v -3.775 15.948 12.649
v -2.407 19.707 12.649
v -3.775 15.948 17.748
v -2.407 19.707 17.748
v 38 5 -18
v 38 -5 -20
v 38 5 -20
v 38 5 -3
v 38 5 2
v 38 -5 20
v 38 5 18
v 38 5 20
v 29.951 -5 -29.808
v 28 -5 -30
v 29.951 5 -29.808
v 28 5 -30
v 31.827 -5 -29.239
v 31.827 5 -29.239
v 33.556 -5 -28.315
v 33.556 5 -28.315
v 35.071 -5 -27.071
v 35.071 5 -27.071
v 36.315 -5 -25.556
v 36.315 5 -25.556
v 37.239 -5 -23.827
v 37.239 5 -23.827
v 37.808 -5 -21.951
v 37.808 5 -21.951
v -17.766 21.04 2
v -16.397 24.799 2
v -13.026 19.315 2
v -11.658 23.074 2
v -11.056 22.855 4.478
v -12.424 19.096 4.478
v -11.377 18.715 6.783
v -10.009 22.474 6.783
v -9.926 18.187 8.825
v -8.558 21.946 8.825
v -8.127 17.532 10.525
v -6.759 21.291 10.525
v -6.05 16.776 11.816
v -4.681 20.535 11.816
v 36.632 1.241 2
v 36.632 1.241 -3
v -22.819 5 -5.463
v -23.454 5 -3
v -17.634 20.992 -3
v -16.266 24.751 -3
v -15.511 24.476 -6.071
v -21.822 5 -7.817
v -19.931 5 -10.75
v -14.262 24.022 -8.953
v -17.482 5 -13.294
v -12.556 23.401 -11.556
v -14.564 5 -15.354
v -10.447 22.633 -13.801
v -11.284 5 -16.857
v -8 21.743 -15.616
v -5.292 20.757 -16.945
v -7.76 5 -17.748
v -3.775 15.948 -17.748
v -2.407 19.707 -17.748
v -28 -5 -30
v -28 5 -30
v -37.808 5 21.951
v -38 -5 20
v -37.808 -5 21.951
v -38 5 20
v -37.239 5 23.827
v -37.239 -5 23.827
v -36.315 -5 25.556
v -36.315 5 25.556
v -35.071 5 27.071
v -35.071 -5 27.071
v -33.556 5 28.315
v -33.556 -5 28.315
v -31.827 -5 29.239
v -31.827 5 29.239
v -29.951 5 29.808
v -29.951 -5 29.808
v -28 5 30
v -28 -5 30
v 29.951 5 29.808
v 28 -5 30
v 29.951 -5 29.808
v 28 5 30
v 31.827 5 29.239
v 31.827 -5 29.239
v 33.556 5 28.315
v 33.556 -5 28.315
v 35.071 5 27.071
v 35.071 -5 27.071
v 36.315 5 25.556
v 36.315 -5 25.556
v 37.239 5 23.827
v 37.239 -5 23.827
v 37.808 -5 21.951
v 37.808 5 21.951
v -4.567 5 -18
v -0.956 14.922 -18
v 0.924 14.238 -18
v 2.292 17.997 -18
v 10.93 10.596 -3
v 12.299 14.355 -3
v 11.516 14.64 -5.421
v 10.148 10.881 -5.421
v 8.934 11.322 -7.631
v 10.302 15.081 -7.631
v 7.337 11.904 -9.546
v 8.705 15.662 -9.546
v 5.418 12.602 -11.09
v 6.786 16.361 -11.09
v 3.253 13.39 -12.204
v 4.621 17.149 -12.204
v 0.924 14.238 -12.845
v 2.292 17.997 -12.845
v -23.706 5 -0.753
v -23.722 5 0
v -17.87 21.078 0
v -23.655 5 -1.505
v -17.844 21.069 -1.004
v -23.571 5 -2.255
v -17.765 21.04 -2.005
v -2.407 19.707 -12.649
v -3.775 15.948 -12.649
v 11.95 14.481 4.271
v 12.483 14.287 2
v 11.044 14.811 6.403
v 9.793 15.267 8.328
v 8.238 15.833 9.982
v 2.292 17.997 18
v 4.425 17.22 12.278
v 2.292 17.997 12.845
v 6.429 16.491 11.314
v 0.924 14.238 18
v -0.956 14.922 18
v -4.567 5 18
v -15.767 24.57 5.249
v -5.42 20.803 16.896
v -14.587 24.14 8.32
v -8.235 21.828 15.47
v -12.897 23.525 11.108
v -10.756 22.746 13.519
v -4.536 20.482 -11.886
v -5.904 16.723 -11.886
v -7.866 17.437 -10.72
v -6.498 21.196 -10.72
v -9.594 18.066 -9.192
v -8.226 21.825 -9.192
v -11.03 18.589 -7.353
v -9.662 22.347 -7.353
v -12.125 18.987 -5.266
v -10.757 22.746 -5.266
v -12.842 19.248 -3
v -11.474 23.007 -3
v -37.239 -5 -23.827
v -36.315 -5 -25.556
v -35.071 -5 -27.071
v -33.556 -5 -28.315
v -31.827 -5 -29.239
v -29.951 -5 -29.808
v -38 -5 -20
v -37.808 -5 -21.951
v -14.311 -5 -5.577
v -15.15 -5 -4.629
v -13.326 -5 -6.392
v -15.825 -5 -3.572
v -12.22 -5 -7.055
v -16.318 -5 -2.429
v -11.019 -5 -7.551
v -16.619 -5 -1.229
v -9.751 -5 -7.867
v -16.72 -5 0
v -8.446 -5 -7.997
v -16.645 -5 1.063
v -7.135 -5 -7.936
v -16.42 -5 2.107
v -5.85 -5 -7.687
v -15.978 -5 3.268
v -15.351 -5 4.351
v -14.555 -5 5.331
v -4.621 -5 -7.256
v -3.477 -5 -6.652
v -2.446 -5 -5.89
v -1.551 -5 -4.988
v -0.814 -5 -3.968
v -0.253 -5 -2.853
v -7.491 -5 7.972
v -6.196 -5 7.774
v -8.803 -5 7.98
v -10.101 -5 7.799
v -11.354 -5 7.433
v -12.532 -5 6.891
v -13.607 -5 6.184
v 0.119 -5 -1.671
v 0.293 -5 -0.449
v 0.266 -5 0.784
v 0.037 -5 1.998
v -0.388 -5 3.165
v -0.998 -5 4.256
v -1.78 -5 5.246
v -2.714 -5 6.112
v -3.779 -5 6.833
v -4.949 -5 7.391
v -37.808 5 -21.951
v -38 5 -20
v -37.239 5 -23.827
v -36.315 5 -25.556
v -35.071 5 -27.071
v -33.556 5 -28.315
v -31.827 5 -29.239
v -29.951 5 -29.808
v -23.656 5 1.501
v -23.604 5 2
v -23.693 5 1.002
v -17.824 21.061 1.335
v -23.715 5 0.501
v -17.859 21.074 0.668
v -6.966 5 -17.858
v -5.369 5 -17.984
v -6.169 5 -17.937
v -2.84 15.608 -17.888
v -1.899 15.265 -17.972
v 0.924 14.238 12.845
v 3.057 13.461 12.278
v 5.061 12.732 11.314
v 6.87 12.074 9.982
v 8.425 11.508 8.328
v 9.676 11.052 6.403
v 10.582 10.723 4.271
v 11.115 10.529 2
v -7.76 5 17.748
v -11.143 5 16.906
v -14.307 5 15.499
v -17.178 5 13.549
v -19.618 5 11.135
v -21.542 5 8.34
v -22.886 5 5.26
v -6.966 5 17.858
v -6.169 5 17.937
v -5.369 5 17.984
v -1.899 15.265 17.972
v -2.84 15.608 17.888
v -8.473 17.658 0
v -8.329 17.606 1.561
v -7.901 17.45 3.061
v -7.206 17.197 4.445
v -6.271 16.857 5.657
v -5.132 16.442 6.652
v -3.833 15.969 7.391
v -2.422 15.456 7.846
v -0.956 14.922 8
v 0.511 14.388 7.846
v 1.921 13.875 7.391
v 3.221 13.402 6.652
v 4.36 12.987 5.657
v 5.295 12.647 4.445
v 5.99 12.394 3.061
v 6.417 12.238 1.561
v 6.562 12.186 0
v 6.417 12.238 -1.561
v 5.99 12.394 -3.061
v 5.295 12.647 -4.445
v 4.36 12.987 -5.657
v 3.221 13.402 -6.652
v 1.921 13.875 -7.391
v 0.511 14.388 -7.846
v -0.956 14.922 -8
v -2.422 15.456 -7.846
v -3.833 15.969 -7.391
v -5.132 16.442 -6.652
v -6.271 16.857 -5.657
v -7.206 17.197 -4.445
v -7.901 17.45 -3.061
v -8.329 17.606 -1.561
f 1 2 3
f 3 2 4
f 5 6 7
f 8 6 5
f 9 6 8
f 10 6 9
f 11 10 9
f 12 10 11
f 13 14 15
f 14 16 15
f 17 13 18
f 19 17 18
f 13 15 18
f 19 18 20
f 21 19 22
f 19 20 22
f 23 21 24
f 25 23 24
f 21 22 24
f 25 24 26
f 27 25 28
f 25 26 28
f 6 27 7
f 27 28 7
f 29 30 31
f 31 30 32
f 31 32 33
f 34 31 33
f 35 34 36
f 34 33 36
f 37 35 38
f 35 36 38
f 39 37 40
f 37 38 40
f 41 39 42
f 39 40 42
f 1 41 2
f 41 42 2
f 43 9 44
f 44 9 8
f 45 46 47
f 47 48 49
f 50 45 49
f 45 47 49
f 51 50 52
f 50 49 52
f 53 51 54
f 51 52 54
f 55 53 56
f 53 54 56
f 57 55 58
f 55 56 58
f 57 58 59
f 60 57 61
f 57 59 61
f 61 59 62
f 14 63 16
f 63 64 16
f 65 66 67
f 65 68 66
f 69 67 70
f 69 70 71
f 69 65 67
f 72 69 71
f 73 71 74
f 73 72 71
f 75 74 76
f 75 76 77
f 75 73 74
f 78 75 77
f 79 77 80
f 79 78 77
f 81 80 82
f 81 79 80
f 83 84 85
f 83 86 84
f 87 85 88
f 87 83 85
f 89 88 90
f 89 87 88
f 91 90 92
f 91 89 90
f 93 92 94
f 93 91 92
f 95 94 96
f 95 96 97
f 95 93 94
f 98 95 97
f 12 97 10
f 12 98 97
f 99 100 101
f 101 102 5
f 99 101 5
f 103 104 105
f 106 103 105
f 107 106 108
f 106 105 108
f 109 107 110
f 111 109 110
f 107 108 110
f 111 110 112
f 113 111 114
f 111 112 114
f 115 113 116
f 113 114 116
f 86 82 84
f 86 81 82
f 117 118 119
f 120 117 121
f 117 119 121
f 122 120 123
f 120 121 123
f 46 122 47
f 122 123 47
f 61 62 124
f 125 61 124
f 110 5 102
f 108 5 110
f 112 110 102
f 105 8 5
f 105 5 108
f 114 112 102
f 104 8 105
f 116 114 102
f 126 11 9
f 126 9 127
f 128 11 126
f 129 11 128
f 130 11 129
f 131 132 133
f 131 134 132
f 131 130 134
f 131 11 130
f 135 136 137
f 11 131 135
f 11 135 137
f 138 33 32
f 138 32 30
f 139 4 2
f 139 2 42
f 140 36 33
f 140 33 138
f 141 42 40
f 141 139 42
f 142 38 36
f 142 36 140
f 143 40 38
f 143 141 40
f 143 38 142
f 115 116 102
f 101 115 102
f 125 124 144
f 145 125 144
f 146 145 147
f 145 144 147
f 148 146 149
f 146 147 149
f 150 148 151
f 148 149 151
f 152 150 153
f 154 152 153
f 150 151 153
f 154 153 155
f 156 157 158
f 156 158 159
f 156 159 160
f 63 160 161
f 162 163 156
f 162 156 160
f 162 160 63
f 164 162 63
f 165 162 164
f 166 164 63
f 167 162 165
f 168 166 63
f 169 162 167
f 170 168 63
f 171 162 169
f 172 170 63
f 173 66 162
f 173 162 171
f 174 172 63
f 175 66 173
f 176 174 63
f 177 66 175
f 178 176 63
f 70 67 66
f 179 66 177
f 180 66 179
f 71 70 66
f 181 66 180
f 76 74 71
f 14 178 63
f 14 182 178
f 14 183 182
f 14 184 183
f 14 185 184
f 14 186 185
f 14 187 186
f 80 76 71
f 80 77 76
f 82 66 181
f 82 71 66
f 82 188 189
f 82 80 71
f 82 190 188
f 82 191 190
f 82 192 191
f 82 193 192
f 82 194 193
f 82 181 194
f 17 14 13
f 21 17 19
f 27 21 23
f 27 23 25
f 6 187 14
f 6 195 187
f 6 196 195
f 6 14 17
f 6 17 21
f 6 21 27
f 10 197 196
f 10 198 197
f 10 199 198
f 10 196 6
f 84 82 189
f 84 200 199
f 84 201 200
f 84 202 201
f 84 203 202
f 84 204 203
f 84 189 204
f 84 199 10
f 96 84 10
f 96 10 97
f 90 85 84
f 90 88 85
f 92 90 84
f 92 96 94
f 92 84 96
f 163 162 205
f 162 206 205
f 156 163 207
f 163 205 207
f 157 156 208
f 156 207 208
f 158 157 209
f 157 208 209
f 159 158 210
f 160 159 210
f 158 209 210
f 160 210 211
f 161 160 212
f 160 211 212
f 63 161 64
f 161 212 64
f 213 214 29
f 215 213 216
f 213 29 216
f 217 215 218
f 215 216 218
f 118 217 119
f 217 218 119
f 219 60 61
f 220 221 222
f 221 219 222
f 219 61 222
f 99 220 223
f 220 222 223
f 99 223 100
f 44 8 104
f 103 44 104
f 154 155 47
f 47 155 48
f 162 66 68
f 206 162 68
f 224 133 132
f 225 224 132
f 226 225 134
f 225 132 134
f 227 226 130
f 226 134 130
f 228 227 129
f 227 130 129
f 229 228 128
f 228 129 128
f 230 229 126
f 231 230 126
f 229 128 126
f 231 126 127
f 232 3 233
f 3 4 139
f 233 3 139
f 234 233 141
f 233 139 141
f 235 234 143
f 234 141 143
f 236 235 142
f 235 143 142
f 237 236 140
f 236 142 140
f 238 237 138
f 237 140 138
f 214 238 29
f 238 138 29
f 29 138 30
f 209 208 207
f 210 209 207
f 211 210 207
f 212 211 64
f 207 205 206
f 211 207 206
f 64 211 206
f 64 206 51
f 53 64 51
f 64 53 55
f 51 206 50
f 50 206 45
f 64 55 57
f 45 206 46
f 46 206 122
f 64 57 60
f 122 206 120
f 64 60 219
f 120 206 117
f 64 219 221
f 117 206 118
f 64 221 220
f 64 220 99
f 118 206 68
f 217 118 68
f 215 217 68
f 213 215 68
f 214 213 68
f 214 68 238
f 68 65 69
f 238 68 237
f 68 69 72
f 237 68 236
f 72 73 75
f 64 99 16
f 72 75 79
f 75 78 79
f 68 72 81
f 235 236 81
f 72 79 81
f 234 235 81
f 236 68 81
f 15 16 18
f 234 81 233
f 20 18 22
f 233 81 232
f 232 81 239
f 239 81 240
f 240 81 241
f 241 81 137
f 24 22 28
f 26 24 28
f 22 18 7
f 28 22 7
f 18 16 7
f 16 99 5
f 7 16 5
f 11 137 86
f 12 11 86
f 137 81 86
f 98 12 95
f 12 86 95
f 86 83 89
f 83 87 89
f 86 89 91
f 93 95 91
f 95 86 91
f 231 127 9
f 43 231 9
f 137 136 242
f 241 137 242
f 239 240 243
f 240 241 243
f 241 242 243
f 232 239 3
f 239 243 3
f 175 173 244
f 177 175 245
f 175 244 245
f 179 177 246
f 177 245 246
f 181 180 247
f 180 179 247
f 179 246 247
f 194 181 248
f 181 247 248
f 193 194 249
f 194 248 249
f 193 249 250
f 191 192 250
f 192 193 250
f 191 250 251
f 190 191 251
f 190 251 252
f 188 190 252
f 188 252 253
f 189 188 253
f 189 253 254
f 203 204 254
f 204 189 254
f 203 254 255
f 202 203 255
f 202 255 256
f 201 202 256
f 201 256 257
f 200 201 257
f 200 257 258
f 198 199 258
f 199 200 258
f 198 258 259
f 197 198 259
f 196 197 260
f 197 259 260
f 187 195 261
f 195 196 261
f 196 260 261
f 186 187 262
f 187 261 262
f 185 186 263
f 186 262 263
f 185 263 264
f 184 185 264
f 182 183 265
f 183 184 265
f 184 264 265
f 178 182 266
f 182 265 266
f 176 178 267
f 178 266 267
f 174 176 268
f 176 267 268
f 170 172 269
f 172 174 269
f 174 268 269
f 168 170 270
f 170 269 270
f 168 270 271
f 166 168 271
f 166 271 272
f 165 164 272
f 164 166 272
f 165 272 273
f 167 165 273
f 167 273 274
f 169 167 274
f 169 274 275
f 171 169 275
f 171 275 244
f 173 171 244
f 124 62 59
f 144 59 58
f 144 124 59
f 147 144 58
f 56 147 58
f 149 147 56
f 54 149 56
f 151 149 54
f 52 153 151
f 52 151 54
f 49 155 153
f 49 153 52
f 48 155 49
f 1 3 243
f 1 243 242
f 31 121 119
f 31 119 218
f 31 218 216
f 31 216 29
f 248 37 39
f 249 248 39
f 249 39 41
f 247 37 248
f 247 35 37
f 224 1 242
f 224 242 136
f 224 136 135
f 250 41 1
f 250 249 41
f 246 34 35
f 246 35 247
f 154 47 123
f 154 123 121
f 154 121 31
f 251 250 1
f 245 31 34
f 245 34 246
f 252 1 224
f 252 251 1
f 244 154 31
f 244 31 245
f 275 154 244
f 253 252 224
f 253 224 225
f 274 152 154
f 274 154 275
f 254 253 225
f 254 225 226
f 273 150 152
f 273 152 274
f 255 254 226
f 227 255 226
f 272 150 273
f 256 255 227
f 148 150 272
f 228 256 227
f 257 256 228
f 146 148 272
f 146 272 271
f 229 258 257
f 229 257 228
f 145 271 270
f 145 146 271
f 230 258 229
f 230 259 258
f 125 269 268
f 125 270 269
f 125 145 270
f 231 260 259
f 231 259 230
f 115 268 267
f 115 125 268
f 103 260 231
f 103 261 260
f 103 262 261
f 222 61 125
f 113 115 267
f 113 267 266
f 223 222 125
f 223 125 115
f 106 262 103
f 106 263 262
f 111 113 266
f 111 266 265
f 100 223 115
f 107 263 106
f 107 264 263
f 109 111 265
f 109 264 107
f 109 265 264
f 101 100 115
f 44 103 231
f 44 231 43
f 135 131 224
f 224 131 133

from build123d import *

# Parameters (mm, degrees)
BOSS_EXTRUDE1_DEPTH = 30
BOSS_EXTRUDE2_DEPTH = 18
CUT_EXTRUDE1_REACH  = 59.518
SKETCH12_4_R        = 8
CUT_EXTRUDE2_DEPTH  = 58.518373937
SKETCH12_5_R        = 8
CUT_EXTRUDE3_DEPTH  = 4
FILLET1_R           = 10


with BuildPart() as part:
    # Sketch1 → Boss-Extrude1 (new, symmetric)
    with BuildSketch(Plane.XY):
        Polygon((-23.722310804, 5), (-38, 5), (-38, -5), (38, -5), (38, 5), align=None)
    extrude(amount=BOSS_EXTRUDE1_DEPTH, both=True)

    # Sketch1<4> → Boss-Extrude2 (add, symmetric)
    with BuildSketch(Plane.XY):
        Polygon((-16.502172006, 24.837168313), (-23.722310804, 5), (38, 5), align=None)
    extrude(amount=BOSS_EXTRUDE2_DEPTH, both=True)

    # Cut-Extrude1: up to this plane
    cut_extrude1_end = Plane(origin=(0, 5, 30), z_dir=(0, 1, 0))
    # Sketch2 → Cut-Extrude1 (cut, up to the surface)
    with BuildSketch(Plane(origin=(6.052124605, 16.628075692, 0), x_dir=(0.9396926207859105, -0.34202014332566305, 0), z_dir=(0.34202014332566305, 0.9396926207859105, 0)), mode=Mode.PRIVATE) as cut_extrude1_sk1:
        with BuildLine():
            Line((-6.001781127, 18), (-24.001781127, 18))
            Line((-24.001781127, 18), (-24.001781127, -2e-09))
            ThreePointArc((-24.001781127, -2e-09), (-18.729703189, 12.727922061), (-6.001781127, 18))
        make_face()
    cut_extrude1_tool1 = split(extrude(cut_extrude1_sk1.sketch, amount=-CUT_EXTRUDE1_REACH, mode=Mode.PRIVATE), bisect_by=cut_extrude1_end, keep=Keep.BOTH, mode=Mode.PRIVATE)
    add(cut_extrude1_tool1.solids().sort_by_distance((-12.724022, 23.462034, -13.979377))[0], mode=Mode.SUBTRACT)
    # Sketch2 → Cut-Extrude1 (cut, up to the surface)
    with BuildSketch(Plane(origin=(6.052124605, 16.628075692, 0), x_dir=(0.9396926207859105, -0.34202014332566305, 0), z_dir=(0.34202014332566305, 0.9396926207859105, 0)), mode=Mode.PRIVATE) as cut_extrude1_sk2:
        with BuildLine():
            ThreePointArc((-6.001781127, -18), (-18.729703188, -12.727922062), (-24.001781127, -2e-09))
            Line((-24.001781127, -2e-09), (-24.001781127, -18))
            Line((-24.001781127, -18), (-6.001781127, -18))
        make_face()
    cut_extrude1_tool2 = split(extrude(cut_extrude1_sk2.sketch, amount=-CUT_EXTRUDE1_REACH, mode=Mode.PRIVATE), bisect_by=cut_extrude1_end, keep=Keep.BOTH, mode=Mode.PRIVATE)
    add(cut_extrude1_tool2.solids().sort_by_distance((-12.724022, 23.462034, 13.979377))[0], mode=Mode.SUBTRACT)

    # Sketch12<4> → Cut-Extrude2 (cut, through all)
    with BuildSketch(Plane(origin=(6.052124605, 16.628075692, 0), x_dir=(0.9396926207859105, -0.34202014332566305, 0), z_dir=(0.34202014332566305, 0.9396926207859105, 0))):
        with Locations((-6.001781127, 0)):
            Circle(SKETCH12_4_R)
    extrude(amount=-CUT_EXTRUDE2_DEPTH, mode=Mode.SUBTRACT)

    # Sketch12<5> → Cut-Extrude3 (cut)
    with BuildSketch(Plane(origin=(6.052124605, 16.628075692, 0), x_dir=(0.9396926207859105, -0.34202014332566305, 0), z_dir=(0.34202014332566305, 0.9396926207859105, 0))):
        with BuildLine():
            ThreePointArc((-23.750020476, 3), (-23.938730537, 1.505272688), (-24.001781127, 5e-09))
            ThreePointArc((-24.001781127, 5e-09), (-23.973895482, -1.001551604), (-23.890324947, -2))
            Line((-23.890324947, -2), (-18.847013705, -2))
            ThreePointArc((-18.847013705, -2), (-15.547394686, -8.825036078), (-9.001781127, -12.649110641))
            Line((-9.001781127, -12.649110641), (-9.001781127, -17.748239349))
            ThreePointArc((-9.001781127, -17.748239349), (-7.507053812, -17.93694941), (-6.001781127, -18))
            Line((-6.001781127, -18), (-4.001781127, -18))
            Line((-4.001781127, -18), (-4.001781127, -12.845232579))
            ThreePointArc((-4.001781127, -12.845232579), (3.190607029, -9.192388155), (6.843451452, -2))
            Line((6.843451452, -2), (33.998218873, -2))
            Line((33.998218873, -2), (33.998218873, 3))
            Line((33.998218873, 3), (6.647329514, 3))
            ThreePointArc((6.647329514, 3), (2.823254951, 9.54561356), (-4.001781127, 12.845232579))
            Line((-4.001781127, 12.845232579), (-4.001781127, 18))
            Line((-4.001781127, 18), (-6.001781127, 18))
            ThreePointArc((-6.001781127, 18), (-7.507053812, 17.93694941), (-9.001781127, 17.748239349))
            Line((-9.001781127, 17.748239349), (-9.001781127, 12.649110641))
            ThreePointArc((-9.001781127, 12.649110641), (-15.194169282, 9.192388155), (-18.650891767, 3))
            Line((-18.650891767, 3), (-23.750020476, 3))
        make_face()
        with Locations((-6.001781127, 0)):
            Circle(SKETCH12_5_R, mode=Mode.SUBTRACT)
    extrude(amount=-CUT_EXTRUDE3_DEPTH, mode=Mode.SUBTRACT)

    # Fillet1
    fillet1_edges = [part.edges().sort_by_distance(p)[0] for p in [
        (-38, 0, -30),
        (38, 0, -30),
        (38, 0, 30),
        (-38, 0, 30),
    ]]
    fillet(fillet1_edges, radius=FILLET1_R)


solid = part.part
